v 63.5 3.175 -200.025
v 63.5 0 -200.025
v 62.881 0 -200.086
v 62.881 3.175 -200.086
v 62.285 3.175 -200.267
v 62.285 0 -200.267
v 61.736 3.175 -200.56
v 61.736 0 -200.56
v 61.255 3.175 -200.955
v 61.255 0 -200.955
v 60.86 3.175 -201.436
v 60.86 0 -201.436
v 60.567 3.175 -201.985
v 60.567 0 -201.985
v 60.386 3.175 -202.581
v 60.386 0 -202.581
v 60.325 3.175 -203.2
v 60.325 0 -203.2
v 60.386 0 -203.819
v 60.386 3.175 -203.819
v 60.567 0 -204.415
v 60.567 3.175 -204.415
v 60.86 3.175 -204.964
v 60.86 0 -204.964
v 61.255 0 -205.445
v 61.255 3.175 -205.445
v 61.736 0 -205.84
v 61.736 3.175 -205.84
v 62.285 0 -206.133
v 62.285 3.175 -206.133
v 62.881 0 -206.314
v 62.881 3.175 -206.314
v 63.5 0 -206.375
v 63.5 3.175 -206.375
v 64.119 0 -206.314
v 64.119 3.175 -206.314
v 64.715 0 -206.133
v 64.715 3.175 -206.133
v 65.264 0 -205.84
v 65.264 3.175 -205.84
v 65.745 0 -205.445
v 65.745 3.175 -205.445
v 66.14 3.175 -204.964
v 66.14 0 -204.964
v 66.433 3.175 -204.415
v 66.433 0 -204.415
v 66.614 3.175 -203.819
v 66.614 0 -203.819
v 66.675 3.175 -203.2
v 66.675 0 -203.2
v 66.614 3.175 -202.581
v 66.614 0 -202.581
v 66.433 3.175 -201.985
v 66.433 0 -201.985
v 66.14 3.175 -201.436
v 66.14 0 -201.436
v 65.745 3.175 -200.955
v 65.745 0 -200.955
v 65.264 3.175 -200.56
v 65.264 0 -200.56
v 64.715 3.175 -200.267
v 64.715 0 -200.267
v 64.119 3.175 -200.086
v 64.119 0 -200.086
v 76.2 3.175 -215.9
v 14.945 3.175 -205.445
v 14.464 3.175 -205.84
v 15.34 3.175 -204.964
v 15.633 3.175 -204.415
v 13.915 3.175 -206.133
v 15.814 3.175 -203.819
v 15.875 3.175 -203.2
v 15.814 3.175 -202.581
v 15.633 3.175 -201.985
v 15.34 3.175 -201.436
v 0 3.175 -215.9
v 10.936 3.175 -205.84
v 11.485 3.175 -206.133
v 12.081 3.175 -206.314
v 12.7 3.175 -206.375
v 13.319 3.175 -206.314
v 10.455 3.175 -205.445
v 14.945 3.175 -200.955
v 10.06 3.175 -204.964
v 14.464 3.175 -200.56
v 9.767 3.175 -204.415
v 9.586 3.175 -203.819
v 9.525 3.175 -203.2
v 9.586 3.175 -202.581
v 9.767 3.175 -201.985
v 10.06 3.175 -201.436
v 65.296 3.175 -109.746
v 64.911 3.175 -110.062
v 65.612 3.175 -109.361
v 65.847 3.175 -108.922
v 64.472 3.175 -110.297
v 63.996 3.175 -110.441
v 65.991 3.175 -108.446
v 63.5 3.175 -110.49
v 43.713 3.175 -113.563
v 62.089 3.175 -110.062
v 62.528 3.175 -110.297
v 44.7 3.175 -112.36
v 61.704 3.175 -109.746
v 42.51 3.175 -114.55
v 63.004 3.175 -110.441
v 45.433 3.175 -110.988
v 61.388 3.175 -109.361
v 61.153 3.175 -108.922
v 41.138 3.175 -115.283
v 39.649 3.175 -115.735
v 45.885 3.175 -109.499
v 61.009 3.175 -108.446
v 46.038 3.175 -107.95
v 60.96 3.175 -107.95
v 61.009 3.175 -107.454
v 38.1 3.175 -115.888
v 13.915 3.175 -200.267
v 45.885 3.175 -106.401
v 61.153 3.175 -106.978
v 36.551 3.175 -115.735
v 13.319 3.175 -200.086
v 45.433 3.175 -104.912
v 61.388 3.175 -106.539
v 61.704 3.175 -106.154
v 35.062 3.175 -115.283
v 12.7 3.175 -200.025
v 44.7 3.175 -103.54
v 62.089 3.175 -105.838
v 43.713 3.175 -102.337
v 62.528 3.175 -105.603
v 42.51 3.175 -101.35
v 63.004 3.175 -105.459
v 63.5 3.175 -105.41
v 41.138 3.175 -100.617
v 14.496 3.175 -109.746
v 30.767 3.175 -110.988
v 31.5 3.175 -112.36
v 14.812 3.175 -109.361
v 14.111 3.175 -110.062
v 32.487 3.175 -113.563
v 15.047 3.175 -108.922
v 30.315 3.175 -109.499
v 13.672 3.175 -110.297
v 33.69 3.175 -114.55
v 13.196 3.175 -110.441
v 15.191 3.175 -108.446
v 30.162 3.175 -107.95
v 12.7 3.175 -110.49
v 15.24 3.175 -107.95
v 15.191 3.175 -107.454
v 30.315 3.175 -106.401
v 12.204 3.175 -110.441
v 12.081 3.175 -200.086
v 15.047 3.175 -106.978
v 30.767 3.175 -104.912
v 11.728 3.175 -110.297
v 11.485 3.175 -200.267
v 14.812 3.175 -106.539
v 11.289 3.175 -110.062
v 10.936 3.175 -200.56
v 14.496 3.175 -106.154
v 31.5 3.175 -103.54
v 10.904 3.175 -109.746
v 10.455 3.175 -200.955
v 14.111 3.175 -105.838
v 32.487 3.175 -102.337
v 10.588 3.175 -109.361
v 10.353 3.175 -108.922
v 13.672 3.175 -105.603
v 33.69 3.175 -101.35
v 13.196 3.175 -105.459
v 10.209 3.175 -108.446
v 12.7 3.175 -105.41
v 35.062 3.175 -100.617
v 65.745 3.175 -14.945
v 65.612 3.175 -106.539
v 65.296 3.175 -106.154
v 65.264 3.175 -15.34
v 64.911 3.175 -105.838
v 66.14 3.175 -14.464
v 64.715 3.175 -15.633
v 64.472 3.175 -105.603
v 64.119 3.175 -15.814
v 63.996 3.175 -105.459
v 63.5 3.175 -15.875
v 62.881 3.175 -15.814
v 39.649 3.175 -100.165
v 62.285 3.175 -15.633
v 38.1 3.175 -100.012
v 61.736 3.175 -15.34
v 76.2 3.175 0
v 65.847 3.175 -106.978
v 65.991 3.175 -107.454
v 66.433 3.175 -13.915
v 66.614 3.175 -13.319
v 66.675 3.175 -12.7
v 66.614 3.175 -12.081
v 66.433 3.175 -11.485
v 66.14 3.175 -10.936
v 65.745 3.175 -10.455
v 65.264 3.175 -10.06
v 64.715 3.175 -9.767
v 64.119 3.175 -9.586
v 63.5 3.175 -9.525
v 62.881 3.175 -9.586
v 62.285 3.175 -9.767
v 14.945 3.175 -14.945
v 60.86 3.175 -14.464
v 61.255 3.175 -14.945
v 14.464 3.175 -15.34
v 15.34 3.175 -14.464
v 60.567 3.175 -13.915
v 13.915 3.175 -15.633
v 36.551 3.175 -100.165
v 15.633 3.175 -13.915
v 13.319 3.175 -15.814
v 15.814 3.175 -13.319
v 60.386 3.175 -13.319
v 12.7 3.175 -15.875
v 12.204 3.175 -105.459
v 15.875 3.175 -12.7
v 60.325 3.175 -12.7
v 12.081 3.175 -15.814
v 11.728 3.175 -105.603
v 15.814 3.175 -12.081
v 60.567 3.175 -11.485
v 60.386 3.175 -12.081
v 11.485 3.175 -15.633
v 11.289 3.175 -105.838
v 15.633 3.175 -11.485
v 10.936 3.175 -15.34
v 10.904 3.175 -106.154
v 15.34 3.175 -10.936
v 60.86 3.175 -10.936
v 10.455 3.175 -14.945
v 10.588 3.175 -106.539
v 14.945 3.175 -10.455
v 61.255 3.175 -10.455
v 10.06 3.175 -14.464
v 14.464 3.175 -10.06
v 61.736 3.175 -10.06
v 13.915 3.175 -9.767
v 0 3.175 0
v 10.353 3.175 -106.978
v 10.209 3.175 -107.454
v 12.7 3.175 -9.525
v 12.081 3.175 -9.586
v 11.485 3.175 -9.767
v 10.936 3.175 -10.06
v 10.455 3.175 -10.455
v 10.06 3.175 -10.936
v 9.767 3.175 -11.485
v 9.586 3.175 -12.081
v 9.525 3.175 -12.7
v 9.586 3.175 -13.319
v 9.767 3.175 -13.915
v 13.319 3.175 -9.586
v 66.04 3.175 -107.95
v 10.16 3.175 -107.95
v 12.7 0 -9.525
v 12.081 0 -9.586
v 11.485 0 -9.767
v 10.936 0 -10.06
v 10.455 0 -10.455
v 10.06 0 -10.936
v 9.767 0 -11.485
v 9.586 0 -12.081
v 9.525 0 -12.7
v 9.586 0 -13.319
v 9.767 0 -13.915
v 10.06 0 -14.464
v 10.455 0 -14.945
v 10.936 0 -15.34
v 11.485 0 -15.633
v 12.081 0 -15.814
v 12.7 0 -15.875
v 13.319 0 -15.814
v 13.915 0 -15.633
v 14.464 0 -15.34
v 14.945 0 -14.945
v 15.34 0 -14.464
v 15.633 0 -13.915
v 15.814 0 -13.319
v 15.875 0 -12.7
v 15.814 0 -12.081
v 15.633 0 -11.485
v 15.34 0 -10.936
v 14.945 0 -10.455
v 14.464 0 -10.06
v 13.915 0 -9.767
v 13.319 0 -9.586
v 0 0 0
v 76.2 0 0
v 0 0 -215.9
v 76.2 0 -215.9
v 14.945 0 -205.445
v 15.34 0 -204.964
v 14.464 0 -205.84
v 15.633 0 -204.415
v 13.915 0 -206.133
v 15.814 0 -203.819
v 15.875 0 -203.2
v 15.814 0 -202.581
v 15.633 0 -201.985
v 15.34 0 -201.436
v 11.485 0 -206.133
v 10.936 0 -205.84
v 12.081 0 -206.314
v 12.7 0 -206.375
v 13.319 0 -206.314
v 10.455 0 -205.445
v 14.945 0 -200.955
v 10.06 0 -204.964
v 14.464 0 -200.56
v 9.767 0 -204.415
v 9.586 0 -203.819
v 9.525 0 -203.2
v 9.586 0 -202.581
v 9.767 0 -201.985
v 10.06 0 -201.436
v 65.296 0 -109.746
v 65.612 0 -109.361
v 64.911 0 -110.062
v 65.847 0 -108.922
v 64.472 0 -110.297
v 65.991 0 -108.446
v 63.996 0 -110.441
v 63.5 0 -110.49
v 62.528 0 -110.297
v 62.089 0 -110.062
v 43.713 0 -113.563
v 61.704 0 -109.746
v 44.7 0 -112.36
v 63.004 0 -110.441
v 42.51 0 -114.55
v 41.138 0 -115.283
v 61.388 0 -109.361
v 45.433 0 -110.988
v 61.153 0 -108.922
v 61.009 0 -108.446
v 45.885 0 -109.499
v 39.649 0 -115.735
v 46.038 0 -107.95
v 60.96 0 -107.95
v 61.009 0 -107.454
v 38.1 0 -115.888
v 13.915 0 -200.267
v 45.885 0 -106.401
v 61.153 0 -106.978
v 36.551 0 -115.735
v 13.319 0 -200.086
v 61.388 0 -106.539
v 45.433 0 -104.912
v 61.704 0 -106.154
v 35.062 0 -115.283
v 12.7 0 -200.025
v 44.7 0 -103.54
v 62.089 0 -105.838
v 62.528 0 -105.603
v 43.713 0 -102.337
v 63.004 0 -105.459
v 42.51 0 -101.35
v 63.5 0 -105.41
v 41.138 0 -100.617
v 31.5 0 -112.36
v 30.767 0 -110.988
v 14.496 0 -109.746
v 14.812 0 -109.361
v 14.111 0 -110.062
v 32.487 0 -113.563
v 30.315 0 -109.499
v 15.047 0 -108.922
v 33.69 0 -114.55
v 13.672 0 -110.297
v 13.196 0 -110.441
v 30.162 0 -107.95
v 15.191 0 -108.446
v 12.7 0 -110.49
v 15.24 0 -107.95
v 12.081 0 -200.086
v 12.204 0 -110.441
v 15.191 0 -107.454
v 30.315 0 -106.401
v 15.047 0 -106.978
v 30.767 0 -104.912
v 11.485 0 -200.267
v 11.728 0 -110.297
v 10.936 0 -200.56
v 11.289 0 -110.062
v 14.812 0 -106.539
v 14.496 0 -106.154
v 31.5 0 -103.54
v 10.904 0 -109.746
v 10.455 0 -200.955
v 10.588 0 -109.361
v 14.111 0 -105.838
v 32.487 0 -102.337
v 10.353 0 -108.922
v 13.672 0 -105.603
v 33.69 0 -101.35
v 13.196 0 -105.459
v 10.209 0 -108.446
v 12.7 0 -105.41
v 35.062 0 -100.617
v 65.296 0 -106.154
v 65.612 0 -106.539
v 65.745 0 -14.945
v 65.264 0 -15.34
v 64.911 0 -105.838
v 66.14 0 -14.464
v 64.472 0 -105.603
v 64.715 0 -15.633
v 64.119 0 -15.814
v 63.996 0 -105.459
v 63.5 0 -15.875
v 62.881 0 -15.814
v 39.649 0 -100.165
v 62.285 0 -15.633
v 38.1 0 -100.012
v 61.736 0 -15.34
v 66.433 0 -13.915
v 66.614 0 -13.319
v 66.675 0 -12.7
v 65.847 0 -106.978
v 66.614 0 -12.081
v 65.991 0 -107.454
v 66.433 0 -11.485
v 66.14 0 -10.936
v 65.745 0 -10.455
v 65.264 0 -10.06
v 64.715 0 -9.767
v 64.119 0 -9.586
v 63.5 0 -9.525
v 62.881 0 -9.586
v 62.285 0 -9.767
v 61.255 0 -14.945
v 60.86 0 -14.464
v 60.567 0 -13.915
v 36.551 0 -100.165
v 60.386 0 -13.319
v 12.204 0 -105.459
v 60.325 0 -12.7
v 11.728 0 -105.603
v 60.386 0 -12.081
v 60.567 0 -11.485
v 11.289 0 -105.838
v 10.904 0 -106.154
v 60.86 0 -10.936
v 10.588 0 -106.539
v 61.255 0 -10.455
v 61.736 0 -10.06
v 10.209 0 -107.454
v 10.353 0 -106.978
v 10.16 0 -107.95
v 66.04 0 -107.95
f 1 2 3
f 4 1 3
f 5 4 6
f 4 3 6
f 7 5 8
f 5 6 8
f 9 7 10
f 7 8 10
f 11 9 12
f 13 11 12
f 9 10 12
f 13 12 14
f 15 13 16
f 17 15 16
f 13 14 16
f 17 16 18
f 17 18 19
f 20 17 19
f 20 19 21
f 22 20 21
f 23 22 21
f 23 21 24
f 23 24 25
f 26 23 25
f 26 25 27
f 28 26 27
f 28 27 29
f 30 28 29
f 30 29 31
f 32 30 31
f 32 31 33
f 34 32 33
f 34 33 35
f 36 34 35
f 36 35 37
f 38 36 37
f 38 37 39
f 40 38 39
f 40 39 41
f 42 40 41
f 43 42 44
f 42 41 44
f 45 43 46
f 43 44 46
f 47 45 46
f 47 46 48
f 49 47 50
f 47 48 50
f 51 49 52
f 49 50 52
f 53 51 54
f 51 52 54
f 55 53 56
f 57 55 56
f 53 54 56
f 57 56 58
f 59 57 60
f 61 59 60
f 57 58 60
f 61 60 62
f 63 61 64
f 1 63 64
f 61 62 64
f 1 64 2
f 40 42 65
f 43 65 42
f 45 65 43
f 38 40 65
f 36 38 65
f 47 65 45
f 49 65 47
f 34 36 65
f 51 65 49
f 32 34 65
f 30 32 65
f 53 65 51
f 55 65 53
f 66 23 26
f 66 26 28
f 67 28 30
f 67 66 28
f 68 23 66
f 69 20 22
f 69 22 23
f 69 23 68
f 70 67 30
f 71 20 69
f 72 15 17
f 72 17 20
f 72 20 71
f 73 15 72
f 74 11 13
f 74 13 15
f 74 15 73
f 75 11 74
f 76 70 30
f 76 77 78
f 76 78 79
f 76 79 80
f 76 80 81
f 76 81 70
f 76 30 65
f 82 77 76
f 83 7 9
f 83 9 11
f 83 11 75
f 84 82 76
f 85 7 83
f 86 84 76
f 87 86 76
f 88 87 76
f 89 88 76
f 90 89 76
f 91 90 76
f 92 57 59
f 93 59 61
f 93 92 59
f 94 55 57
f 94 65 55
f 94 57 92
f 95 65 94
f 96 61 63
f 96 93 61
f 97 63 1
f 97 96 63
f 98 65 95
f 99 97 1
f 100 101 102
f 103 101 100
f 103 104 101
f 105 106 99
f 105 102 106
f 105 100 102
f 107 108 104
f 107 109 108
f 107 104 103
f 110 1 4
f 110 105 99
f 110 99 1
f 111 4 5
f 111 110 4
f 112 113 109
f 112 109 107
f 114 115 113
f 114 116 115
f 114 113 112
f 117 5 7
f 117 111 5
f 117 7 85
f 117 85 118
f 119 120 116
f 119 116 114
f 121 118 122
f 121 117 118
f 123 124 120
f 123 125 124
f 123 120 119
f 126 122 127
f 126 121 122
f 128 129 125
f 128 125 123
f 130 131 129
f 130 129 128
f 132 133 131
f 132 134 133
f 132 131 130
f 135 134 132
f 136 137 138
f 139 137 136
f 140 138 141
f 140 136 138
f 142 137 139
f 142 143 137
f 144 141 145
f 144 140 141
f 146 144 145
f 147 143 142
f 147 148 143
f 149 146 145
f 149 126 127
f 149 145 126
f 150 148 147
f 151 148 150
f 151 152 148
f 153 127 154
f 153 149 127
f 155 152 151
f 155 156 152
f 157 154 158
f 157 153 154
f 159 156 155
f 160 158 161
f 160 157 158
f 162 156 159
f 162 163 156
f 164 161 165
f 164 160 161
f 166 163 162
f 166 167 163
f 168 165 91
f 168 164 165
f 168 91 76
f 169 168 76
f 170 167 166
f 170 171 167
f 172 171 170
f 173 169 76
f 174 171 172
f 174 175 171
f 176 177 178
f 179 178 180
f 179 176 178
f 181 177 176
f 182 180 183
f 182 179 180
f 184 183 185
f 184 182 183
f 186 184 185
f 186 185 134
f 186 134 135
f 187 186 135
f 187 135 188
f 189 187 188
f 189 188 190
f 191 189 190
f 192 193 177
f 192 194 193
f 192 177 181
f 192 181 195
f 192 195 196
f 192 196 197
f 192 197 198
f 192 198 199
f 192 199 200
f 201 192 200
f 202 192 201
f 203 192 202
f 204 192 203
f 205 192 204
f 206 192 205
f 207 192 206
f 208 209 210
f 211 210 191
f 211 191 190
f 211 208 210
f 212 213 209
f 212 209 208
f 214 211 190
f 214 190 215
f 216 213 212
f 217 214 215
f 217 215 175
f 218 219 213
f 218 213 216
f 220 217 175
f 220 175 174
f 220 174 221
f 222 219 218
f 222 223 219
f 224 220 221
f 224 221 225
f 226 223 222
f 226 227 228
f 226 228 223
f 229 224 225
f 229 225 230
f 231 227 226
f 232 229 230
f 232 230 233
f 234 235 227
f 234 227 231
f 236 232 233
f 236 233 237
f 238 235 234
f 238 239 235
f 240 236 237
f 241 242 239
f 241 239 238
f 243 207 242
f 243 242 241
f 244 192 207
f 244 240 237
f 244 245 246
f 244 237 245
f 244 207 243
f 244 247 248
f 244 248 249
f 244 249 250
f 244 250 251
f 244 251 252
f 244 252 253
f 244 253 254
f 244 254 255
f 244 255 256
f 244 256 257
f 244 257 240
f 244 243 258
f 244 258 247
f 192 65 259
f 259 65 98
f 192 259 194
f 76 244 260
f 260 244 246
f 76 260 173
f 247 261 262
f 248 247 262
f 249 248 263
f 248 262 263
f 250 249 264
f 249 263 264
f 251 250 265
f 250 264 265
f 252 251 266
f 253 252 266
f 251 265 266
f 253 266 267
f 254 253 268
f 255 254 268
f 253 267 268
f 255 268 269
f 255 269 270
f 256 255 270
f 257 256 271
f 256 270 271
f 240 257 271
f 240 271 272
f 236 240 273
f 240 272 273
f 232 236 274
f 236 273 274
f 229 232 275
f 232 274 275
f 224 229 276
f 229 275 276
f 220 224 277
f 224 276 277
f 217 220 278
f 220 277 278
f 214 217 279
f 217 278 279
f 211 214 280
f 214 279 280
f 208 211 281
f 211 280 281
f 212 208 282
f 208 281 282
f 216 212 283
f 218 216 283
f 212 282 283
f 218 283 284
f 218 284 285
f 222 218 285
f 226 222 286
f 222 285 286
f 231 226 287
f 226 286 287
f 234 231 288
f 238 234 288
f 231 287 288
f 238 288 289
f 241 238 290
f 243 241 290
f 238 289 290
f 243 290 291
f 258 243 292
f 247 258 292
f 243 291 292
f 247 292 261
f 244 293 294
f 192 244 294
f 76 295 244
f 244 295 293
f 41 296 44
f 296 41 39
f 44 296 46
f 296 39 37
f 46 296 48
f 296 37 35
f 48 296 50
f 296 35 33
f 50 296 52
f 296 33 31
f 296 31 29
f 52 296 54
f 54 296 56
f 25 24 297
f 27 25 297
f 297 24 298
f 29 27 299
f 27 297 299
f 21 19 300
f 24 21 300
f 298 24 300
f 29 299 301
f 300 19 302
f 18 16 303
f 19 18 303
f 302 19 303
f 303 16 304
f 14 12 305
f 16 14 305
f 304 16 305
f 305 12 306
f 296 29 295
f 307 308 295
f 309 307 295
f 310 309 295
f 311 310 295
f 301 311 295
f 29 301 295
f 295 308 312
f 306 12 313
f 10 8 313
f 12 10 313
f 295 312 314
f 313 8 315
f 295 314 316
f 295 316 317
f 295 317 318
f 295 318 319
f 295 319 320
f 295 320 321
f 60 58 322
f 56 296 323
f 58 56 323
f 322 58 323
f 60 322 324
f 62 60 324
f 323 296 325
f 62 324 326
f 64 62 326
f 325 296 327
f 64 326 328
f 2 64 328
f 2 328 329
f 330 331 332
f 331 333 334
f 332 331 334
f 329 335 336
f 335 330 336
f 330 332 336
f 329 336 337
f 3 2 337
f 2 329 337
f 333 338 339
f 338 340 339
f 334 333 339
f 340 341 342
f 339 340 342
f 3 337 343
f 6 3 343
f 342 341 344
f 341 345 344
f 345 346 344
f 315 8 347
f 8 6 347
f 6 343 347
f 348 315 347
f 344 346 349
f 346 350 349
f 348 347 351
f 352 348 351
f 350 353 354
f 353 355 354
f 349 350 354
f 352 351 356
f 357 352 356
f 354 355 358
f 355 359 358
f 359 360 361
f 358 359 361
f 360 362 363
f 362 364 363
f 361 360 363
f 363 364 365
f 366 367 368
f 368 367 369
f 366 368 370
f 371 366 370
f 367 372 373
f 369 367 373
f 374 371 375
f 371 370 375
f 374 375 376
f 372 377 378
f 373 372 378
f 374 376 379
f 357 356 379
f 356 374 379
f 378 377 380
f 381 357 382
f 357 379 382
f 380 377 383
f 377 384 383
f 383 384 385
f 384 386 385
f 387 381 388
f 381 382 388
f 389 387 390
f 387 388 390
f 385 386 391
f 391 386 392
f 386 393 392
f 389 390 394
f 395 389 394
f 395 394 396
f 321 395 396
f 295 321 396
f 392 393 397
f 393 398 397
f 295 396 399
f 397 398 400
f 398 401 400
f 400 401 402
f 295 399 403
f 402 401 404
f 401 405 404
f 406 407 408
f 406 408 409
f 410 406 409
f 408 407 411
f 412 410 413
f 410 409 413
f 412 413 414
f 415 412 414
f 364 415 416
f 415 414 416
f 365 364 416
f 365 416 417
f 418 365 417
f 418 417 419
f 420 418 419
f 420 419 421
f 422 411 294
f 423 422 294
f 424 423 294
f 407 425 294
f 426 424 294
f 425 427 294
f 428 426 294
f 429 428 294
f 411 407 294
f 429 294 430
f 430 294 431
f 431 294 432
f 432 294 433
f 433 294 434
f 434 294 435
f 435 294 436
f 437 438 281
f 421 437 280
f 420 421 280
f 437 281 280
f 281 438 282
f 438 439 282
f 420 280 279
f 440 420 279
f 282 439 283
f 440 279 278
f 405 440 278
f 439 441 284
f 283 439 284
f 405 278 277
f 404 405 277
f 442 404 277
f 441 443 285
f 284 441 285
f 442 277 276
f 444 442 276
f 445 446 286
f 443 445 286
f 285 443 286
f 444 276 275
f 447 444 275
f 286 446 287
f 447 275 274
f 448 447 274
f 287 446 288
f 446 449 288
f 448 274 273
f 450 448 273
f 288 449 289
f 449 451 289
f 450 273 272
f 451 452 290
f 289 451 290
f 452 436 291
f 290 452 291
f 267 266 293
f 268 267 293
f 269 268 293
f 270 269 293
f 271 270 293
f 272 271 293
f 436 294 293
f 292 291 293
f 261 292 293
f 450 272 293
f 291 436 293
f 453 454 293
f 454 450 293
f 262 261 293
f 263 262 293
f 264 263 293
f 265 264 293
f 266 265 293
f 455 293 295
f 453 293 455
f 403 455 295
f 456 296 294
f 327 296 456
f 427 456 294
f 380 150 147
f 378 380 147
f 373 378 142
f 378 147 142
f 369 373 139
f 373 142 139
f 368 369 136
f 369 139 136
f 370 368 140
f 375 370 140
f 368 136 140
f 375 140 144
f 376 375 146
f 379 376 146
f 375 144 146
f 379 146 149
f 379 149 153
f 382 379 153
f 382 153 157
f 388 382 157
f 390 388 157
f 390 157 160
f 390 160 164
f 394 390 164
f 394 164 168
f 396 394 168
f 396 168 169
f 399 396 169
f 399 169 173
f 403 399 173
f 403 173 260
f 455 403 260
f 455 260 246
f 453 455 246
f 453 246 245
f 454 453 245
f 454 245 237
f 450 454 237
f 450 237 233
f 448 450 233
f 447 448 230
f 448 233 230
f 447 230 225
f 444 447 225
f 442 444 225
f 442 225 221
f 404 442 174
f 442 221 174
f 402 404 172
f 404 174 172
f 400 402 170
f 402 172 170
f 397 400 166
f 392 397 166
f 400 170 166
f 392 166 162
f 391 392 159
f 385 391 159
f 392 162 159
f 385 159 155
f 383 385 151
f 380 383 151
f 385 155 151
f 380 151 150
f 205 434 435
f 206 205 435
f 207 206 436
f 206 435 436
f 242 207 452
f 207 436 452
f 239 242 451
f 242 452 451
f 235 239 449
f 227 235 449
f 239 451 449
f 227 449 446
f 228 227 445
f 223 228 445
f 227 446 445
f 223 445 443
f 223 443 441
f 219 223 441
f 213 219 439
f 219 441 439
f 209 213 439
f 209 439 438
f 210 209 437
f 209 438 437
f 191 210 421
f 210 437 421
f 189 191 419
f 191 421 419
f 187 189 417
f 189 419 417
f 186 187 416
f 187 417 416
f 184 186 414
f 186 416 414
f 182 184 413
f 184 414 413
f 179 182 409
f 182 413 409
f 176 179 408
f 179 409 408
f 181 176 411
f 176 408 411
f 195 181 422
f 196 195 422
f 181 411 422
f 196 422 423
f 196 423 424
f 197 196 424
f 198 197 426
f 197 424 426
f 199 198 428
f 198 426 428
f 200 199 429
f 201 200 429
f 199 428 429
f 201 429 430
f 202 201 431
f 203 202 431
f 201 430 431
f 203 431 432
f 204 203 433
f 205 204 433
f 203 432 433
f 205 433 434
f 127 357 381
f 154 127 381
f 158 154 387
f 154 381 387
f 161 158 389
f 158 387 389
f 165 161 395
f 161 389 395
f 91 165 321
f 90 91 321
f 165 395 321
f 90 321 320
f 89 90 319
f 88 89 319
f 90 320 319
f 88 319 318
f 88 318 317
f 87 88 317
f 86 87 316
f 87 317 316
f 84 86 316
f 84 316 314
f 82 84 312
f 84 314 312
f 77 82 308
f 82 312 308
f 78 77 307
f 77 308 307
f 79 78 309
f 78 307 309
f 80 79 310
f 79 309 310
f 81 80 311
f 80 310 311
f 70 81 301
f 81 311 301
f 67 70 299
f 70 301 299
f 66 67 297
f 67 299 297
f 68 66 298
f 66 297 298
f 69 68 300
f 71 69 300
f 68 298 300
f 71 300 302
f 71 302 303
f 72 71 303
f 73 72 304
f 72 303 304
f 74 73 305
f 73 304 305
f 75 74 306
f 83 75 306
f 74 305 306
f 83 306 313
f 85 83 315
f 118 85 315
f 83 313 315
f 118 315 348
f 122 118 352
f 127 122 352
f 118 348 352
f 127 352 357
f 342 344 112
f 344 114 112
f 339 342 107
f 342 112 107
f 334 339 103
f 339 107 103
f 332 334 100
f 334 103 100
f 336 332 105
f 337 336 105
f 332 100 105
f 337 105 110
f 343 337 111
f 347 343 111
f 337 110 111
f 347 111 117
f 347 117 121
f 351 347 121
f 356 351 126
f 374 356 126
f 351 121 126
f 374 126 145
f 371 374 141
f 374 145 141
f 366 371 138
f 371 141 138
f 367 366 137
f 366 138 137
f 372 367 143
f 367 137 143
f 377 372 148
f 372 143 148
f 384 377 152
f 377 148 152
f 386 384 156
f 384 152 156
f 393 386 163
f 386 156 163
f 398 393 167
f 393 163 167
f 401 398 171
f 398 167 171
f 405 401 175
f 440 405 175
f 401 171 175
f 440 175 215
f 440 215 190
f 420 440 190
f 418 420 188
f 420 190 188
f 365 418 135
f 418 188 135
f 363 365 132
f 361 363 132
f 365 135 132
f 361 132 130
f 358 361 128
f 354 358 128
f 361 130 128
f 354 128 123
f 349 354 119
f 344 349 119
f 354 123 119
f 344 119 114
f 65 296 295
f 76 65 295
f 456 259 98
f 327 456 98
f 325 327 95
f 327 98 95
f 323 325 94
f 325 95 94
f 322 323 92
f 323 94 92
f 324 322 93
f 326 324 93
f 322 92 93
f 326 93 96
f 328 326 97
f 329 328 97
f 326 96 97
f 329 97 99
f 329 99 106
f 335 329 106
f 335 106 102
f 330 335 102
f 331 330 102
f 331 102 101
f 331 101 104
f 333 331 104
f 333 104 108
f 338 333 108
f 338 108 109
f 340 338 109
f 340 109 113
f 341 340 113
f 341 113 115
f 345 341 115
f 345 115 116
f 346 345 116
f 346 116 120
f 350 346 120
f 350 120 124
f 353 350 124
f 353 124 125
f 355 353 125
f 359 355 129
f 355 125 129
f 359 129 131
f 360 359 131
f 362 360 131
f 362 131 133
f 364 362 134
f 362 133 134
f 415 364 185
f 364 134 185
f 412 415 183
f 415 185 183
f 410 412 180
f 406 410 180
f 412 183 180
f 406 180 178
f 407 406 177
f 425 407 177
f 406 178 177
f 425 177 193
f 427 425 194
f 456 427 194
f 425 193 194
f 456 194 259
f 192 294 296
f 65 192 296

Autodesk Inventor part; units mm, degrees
ref_plane "YZ Plane" through (0, 0, 0) normal (1, 0, 0) x (0, 1, 0)
ref_plane "XZ Plane" through (0, 0, 0) normal (0, 1, 0) x (-1, 0, 0)
ref_plane "XY Plane" through (0, 0, 0) normal (0, 0, 1) x (1, 0, 0)
sketch "Sketch1" plane through (0, 0, 0) normal (0, 1, 0) x (-1, 0, 0)
  line L0 (0, 0) -> (-76.2, 0)
  line L1 (-76.2, 0) -> (-76.2, -215.9)
  line L2 (-76.2, -215.9) -> (0, -215.9)
  line L3 (0, -215.9) -> (0, 0)
  dimension "d0" = 76.2
  dimension "d1" = 215.9
extrude "Extrusion1" add sketch "Sketch1" along normal blind 3.175
sketch "Sketch2" plane through (0, 3.175, 0) normal (0, 1, 0) x (1, 0, 0)
  line L0 (0, 0) -> (76.2, 0) projected
  line L1 (0, 215.9) -> (0, 0) projected
  circle A0 centre (12.7, 107.95) radius 2.54
  circle A1 centre (63.5, 107.95) radius 2.54
  circle A2 centre (38.1, 107.95) radius 7.9375
  dimension "d4" = 107.95
  dimension "d5" = 38.1
  dimension "d6" = 25.4
  dimension "d7" = 25.4
  dimension "d8" = 107.95
  dimension "d9" = 107.95
  dimension "d10" = 5.08
  dimension "d11" = 5.08
  dimension "d12" = 15.875
extrude "Extrusion2" cut sketch "Sketch2" against normal blind 25.4
sketch "Sketch3" plane through (0, 3.175, 0) normal (0, 1, 0) x (1, 0, 0)
  line L0 (0, 0) -> (76.2, 0) projected
  line L1 (76.2, 0) -> (76.2, 215.9) projected
  line L2 (76.2, 215.9) -> (0, 215.9) projected
  line L3 (0, 215.9) -> (0, 0) projected
  point P0 (12.7, 12.7)
  point P1 (63.5, 12.7)
  point P2 (63.5, 203.2)
  point P3 (12.7, 203.2)
  dimension "d15" = 12.7
  dimension "d16" = 12.7
  dimension "d17" = 12.7
  dimension "d18" = 12.7
  dimension "d19" = 12.7
  dimension "d20" = 12.7
  dimension "d21" = 12.7
  dimension "d22" = 12.7
hole "Hole1" at (12.7, 3.175, -12.7) at (63.5, 3.175, -12.7) at (63.5, 3.175, -203.2) at (12.7, 3.175, -203.2) direction (0, -1, 0) diameter 6.35 end through all
properties part number "motor support plate" material "Aluminum 6061"
